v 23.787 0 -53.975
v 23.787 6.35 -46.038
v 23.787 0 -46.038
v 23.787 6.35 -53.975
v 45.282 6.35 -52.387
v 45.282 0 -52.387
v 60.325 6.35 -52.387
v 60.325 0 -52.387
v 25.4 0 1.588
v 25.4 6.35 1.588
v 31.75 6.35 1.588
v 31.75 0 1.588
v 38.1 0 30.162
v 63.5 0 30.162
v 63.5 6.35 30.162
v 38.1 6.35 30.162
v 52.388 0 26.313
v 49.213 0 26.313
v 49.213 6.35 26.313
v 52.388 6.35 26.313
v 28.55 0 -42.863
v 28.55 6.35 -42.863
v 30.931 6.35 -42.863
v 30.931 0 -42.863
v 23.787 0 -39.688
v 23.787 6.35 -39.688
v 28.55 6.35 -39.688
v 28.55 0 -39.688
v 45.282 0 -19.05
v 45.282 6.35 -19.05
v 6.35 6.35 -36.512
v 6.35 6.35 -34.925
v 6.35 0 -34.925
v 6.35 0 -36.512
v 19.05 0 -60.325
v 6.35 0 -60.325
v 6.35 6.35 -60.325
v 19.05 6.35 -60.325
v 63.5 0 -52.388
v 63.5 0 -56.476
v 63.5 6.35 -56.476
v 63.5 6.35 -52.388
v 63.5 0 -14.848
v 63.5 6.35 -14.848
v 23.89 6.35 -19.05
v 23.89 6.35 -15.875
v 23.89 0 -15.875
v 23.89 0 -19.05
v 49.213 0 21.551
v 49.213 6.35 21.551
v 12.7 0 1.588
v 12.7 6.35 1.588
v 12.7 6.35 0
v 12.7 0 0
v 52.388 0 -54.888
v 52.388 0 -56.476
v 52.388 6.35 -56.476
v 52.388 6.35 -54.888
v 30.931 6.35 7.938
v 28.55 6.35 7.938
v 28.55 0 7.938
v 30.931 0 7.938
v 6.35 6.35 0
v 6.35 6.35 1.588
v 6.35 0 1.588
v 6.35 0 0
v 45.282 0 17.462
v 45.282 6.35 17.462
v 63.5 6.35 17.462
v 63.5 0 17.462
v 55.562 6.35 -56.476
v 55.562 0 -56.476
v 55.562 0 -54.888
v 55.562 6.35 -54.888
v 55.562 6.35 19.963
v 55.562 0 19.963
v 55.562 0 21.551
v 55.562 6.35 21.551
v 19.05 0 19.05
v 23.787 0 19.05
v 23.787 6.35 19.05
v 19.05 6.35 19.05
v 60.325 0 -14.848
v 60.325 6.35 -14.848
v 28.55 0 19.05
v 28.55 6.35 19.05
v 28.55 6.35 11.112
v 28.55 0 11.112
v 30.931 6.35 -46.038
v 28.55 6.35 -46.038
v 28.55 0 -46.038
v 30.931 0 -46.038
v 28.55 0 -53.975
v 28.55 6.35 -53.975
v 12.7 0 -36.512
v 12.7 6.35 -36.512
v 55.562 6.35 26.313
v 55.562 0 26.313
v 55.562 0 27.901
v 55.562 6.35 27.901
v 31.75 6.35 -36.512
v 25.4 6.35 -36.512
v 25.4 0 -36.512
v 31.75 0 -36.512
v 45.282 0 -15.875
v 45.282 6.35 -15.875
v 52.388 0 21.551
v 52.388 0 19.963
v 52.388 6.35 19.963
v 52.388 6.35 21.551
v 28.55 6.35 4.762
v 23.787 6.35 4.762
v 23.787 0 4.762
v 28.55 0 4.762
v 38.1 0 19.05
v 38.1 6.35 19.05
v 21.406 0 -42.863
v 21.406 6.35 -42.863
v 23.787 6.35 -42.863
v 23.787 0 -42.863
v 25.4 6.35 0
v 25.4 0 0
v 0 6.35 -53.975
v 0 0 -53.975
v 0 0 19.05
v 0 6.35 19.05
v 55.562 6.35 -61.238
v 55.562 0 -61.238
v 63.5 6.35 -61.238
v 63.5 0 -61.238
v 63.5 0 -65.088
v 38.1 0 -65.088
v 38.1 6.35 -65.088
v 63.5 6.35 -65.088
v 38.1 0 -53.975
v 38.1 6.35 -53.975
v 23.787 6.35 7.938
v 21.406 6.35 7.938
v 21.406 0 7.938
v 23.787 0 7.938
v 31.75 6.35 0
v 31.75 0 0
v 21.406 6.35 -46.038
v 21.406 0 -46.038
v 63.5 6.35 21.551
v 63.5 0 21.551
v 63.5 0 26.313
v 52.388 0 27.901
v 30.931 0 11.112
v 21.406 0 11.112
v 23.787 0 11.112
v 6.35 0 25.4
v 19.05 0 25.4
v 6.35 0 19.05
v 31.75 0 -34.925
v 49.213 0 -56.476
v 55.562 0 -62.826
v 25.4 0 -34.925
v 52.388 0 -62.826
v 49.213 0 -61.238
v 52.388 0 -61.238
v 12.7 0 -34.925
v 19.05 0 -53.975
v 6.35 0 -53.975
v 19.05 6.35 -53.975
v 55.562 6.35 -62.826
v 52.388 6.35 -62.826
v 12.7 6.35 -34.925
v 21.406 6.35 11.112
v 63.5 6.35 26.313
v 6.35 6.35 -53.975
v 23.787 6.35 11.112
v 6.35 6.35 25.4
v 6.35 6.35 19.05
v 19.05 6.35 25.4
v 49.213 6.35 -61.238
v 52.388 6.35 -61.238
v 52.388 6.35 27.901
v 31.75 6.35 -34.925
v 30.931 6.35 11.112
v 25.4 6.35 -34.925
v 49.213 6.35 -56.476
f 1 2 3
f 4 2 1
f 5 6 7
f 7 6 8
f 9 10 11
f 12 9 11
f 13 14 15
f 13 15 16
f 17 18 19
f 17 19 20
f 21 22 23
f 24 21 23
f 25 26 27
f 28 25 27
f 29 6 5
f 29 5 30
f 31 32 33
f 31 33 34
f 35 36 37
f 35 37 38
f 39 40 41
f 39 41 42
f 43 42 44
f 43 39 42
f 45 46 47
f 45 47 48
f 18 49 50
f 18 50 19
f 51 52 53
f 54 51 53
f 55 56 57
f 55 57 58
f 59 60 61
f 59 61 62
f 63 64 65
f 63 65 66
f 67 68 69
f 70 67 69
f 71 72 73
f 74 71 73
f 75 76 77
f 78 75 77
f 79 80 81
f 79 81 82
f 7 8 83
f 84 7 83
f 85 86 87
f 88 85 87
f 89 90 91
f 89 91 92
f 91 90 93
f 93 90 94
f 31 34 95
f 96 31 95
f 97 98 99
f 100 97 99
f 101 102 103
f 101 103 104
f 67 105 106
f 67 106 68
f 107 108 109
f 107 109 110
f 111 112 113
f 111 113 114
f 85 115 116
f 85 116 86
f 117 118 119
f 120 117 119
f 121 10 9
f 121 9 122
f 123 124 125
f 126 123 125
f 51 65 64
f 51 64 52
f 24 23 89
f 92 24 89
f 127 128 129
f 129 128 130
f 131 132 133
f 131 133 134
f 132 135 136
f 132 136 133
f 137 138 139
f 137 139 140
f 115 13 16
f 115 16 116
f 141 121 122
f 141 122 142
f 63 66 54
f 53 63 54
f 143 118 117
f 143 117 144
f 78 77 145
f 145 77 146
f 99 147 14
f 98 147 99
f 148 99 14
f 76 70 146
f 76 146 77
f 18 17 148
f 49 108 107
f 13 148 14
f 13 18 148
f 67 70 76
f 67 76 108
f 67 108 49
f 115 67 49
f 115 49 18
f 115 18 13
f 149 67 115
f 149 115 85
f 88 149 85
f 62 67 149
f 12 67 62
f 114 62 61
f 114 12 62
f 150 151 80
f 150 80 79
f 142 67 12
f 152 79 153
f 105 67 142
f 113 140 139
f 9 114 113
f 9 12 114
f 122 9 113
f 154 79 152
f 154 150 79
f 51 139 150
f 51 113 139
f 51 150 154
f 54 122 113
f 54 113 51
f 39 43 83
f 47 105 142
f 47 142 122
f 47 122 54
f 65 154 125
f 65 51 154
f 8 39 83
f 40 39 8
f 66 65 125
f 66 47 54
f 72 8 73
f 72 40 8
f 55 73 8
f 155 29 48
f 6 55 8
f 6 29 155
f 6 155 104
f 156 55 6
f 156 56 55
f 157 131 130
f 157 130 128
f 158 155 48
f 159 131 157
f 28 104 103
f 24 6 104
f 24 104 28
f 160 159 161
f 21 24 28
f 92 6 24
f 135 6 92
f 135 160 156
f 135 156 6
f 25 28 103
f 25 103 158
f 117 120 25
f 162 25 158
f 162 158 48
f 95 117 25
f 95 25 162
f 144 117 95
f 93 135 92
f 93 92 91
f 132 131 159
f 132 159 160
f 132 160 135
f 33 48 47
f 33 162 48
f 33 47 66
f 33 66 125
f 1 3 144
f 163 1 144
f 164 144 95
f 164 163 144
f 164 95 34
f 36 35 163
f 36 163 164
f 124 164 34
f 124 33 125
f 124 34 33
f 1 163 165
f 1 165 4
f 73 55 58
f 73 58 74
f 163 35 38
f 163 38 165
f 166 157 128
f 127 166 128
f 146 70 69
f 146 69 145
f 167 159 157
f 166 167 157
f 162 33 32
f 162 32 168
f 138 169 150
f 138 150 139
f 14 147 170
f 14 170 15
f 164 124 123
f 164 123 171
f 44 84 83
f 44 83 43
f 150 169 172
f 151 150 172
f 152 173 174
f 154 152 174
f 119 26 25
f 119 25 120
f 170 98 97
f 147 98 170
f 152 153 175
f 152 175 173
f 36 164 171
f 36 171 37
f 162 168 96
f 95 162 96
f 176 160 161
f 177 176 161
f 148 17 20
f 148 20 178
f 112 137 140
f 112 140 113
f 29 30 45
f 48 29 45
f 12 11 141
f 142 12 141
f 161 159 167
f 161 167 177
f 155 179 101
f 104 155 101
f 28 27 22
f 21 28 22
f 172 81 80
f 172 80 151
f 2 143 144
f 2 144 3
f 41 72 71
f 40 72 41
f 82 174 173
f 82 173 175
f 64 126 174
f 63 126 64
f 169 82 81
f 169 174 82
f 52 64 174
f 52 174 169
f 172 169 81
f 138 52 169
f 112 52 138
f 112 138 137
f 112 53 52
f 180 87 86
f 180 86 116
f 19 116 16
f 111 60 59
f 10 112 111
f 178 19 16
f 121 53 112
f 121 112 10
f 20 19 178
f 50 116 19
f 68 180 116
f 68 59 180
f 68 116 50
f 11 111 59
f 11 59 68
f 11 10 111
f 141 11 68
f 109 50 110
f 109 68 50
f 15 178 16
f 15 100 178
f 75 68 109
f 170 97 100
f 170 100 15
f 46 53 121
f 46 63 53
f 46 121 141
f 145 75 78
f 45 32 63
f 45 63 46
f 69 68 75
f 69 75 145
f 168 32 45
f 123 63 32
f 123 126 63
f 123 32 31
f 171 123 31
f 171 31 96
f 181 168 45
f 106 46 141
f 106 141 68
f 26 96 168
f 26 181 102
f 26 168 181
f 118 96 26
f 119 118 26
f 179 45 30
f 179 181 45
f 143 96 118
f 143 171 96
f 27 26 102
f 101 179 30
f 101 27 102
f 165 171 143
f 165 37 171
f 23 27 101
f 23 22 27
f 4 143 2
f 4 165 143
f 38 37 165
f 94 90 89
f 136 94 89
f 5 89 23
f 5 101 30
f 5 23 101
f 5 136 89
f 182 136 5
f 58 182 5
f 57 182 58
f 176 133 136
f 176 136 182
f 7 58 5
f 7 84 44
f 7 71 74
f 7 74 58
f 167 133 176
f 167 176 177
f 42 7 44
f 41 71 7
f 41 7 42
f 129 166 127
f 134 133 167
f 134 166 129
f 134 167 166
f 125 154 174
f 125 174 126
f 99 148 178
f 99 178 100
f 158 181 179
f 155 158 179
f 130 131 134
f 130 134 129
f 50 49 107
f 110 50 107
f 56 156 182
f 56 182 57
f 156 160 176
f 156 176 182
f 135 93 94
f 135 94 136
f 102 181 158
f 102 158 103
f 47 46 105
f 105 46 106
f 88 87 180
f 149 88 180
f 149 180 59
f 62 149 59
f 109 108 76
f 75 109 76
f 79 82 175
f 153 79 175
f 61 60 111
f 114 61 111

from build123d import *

# Parameters (mm, degrees)
BOSS_EXTRUDE1_DEPTH = 6.35
SKETCH2_W           = 6.35
SKETCH2_H           = 1.5875
CUT_EXTRUDE1_DEPTH  = 6.35
BOSS_EXTRUDE2_START = -6.35
SKETCH4_W           = 24.326613467
SKETCH4_H           = 69.85
BOSS_EXTRUDE2_DEPTH = 6.35
SKETCH5_W           = 25.4
SKETCH5_H           = 3.175
CUT_EXTRUDE3_DEPTH  = 6.35
SKETCH7_W           = 19.923596682
SKETCH7_H           = 95.25
CUT_EXTRUDE4_DEPTH  = 6.35
SKETCH8_W           = 15.043251586
SKETCH8_H           = 69.85
CUT_EXTRUDE5_DEPTH  = 6.35
SKETCH9_W           = 3.175
SKETCH9_H           = 95.25
BOSS_EXTRUDE3_DEPTH = 6.35
SKETCH10_W          = 17.539756693
SKETCH10_H          = 95.25
CUT_EXTRUDE7_DEPTH  = 6.35
SKETCH3_W           = 4.7625
SKETCH3_H           = 14.2875
SKETCH3_W_2         = 9.525
SKETCH3_H_2         = 3.175
CUT_EXTRUDE8_DEPTH  = 6.35
SKETCH11_W          = 14.2875
SKETCH11_H          = 4.7625
SKETCH11_W_2        = 3.175
SKETCH11_H_2        = 7.9375
CUT_EXTRUDE9_DEPTH  = 6.35
SKETCH14_W          = 14.575398065
SKETCH14_H          = 32.31050226
CUT_EXTRUDE11_DEPTH = 6.35


with BuildPart() as part:
    # Sketch1 → Boss-Extrude1 (new body)
    with BuildSketch(Plane(origin=(0, 0, 0), x_dir=(1, 0, 0), z_dir=(0, 1, 0))):
        Polygon((38.1, 65.0875), (84.214756693, 65.0875), (84.214756693, -30.1625), (38.1, -30.1625), (38.1, -19.05), (19.05, -19.05), (19.05, -25.4), (6.35, -25.4), (6.35, -19.05), (0, -19.05), (0, 0), (0, 34.925), (0, 53.975), (6.35, 53.975), (6.35, 60.325), (19.05, 60.325), (19.05, 53.975), (38.1, 53.975), align=None)
        Polygon((38.1, 34.925), (44.45, 38.591174209), (44.45, 52.3875), (74.689756693, 52.3875), (77.864756693, 50.8), (77.864756693, -15.875), (74.689756693, -17.4625), (44.45, -17.4625), (44.45, -3.666174209), (38.1, 0), align=None, mode=Mode.SUBTRACT)
    extrude(amount=BOSS_EXTRUDE1_DEPTH)

    # Sketch2 → Cut-Extrude1 (cut)
    with BuildSketch(Plane(origin=(0, 6.35, 0), x_dir=(1, 0, 0), z_dir=(0, 1, 0))):
        with Locations((9.525, 35.71875)):
            Rectangle(SKETCH2_W, SKETCH2_H)
        with Locations((9.525, -0.79375)):
            Rectangle(SKETCH2_W, SKETCH2_H)
        with Locations((28.575, 35.71875)):
            Rectangle(SKETCH2_W, SKETCH2_H)
        with Locations((28.575, -0.79375)):
            Rectangle(SKETCH2_W, SKETCH2_H)
    extrude(amount=-CUT_EXTRUDE1_DEPTH, mode=Mode.SUBTRACT)

    # Sketch4 → Boss-Extrude2 (add)
    with BuildSketch(Plane(origin=(0, 6.35, 0), x_dir=(1, 0, 0), z_dir=(0, 1, 0)).offset(BOSS_EXTRUDE2_START)):
        with Locations((49.82644996, 17.4625)):
            Rectangle(SKETCH4_W, SKETCH4_H)
    extrude(amount=BOSS_EXTRUDE2_DEPTH)

    # Sketch5 → Cut-Extrude3 (cut)
    with BuildSketch(Plane(origin=(0, 6.35, 0), x_dir=(1, 0, 0), z_dir=(0, 1, 0))):
        with Locations((61.989756693, 17.4625)):
            Rectangle(SKETCH5_W, SKETCH5_H)
        with Locations((36.589756693, 17.4625)):
            Rectangle(SKETCH5_W, SKETCH5_H)
    extrude(amount=-CUT_EXTRUDE3_DEPTH, mode=Mode.SUBTRACT)

    # Sketch7 → Cut-Extrude4 (cut)
    with BuildSketch(Plane(origin=(0, 6.35, 0), x_dir=(1, 0, 0), z_dir=(0, 1, 0))):
        with Locations((91.001555034, 17.4625)):
            Rectangle(SKETCH7_W, SKETCH7_H)
    extrude(amount=-CUT_EXTRUDE4_DEPTH, mode=Mode.SUBTRACT)

    # Sketch8 → Cut-Extrude5 (cut)
    with BuildSketch(Plane.XZ):
        with Locations((52.803374207, -17.4625)):
            Rectangle(SKETCH8_W, SKETCH8_H)
    extrude(amount=-CUT_EXTRUDE5_DEPTH, mode=Mode.SUBTRACT)

    # Sketch9 → Boss-Extrude3 (add)
    with BuildSketch(Plane.XZ):
        with Locations((61.9125, -17.4625)):
            Rectangle(SKETCH9_W, SKETCH9_H)
    extrude(amount=-BOSS_EXTRUDE3_DEPTH)

    # Sketch10 → Cut-Extrude7 (cut)
    with BuildSketch(Plane.XZ):
        with Locations((72.269878347, -17.4625)):
            Rectangle(SKETCH10_W, SKETCH10_H)
    extrude(amount=-CUT_EXTRUDE7_DEPTH, mode=Mode.SUBTRACT)

    # Sketch3 → Cut-Extrude8 (cut)
    with BuildSketch(Plane(origin=(0, 6.35, 0), x_dir=(1, 0, 0), z_dir=(0, 1, 0))):
        with Locations((26.168267374, 46.83125)):
            Rectangle(SKETCH3_W, SKETCH3_H)
        with Locations((26.168267374, 44.45)):
            Rectangle(SKETCH3_W_2, SKETCH3_H_2)
        with Locations((26.168267374, -9.525)):
            Rectangle(SKETCH3_W_2, SKETCH3_H_2)
        with Locations((26.168267374, -11.90625)):
            Rectangle(SKETCH3_W, SKETCH3_H)
    extrude(amount=-CUT_EXTRUDE8_DEPTH, mode=Mode.SUBTRACT)

    # Sketch11 → Cut-Extrude9 (cut)
    with BuildSketch(Plane.XZ):
        with Locations((56.35625, 23.932056084)):
            Rectangle(SKETCH11_W, SKETCH11_H)
        with Locations((53.975, 23.932056084)):
            Rectangle(SKETCH11_W_2, SKETCH11_H_2)
        with Locations((53.975, -58.857056084)):
            Rectangle(SKETCH11_W_2, SKETCH11_H_2)
        with Locations((56.35625, -58.857056084)):
            Rectangle(SKETCH11_W, SKETCH11_H)
    extrude(amount=-CUT_EXTRUDE9_DEPTH, mode=Mode.SUBTRACT)

    # Sketch14 → Cut-Extrude11 (cut)
    with BuildSketch(Plane(origin=(0, 6.35, 0), x_dir=(1, 0, 0), z_dir=(0, 1, 0))):
        with Locations((67.612699033, -1.30724887)):
            Rectangle(SKETCH14_W, SKETCH14_H)
    extrude(amount=-CUT_EXTRUDE11_DEPTH, mode=Mode.SUBTRACT)


solid = part.part
